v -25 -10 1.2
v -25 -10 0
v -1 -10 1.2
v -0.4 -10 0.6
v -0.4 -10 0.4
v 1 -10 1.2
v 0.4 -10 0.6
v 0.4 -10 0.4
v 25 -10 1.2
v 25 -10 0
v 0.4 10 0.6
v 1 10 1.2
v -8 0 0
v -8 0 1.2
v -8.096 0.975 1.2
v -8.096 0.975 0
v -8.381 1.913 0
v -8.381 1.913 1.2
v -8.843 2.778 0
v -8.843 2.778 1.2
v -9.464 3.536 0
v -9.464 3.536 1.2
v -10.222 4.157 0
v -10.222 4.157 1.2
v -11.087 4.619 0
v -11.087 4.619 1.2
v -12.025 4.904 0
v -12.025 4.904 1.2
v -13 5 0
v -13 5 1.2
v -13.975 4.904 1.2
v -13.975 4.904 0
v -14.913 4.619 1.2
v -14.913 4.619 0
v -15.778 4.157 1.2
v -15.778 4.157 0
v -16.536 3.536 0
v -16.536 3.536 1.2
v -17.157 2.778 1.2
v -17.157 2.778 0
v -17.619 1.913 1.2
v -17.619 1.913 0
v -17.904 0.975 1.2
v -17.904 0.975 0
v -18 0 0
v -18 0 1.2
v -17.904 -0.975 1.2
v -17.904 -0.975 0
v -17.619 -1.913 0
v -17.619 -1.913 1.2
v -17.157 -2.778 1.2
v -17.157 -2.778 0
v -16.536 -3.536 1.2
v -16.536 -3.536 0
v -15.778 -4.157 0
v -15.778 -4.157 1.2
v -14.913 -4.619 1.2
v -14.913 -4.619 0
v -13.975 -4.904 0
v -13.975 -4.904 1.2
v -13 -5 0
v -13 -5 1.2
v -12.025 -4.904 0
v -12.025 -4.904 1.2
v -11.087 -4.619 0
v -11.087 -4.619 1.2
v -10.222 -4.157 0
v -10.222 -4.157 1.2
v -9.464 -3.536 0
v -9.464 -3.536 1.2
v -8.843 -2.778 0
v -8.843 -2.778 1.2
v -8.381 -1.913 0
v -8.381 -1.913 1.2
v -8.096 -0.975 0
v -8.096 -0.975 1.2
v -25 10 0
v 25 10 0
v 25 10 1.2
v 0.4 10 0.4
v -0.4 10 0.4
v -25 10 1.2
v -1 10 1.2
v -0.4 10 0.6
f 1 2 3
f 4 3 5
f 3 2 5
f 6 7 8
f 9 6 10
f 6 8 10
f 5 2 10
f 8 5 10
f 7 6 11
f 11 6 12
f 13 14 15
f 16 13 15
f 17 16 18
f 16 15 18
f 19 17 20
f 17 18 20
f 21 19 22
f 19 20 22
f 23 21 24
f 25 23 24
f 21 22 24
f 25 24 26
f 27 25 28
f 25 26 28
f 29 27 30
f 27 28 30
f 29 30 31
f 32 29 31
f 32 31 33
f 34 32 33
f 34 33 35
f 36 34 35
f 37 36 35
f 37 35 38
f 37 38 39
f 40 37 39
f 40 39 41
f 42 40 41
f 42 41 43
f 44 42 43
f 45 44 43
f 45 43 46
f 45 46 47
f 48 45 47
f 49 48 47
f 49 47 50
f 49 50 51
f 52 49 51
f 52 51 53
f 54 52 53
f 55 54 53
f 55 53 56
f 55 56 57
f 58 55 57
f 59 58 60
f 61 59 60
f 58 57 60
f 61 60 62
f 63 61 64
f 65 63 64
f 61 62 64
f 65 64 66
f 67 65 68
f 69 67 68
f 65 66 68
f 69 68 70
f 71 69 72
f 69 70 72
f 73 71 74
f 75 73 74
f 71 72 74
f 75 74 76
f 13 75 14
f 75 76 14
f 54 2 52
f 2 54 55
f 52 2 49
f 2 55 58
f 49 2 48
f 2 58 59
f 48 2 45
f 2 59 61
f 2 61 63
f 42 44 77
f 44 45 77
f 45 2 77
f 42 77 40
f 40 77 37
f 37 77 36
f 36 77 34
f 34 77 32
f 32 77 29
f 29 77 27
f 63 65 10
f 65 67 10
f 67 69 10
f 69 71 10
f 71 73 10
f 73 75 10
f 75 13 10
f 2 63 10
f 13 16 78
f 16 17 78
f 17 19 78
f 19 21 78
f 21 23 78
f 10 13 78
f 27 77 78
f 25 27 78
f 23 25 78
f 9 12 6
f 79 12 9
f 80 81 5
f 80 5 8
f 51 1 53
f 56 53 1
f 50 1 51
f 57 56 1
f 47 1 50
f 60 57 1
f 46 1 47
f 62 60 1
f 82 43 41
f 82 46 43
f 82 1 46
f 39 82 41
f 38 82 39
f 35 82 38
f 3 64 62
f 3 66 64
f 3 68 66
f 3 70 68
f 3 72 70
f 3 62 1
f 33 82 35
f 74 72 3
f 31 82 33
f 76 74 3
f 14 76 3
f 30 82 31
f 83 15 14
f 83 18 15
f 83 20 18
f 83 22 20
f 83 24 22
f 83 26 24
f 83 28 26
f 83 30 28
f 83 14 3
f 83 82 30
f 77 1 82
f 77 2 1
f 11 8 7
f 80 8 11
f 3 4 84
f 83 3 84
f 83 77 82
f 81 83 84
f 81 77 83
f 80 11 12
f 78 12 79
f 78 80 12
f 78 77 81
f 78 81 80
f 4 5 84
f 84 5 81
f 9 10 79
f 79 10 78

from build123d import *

# Parameters (mm, degrees)
F0_W     = 50
F0_H     = 20
F1_DEPTH = 0.4
F2_W     = 24.6
F2_H     = 20
F3_DEPTH = 0.8
F4_R     = 5
F5_DEPTH = 25
F6_SIZE  = 0.6


with BuildPart() as f1:
    # F0 (on Top) → F1 (new body)
    with BuildSketch(Plane.XY):
        Rectangle(F0_W, F0_H)
    extrude(amount=F1_DEPTH)

    # F2 (on face) → F3 (join)
    with BuildSketch(Plane.XY.offset(0.4)):
        with Locations((-12.7, 0)):
            Rectangle(F2_W, F2_H)
        with Locations((12.7, 0)):
            Rectangle(F2_W, F2_H)
    extrude(amount=F3_DEPTH)

    # F4 (on face) → F5 (cut)
    with BuildSketch(Plane.XY.offset(1.2)):
        with Locations((-13, 0)):
            Circle(F4_R)
    extrude(amount=-F5_DEPTH, mode=Mode.SUBTRACT)

    # F6
    f6_edges = [f1.edges().sort_by_distance(p)[0] for p in [
        (-0.4, 0, 1.2),
        (0.4, 0, 1.2),
    ]]
    chamfer(f6_edges, length=F6_SIZE)


solid = f1.part
